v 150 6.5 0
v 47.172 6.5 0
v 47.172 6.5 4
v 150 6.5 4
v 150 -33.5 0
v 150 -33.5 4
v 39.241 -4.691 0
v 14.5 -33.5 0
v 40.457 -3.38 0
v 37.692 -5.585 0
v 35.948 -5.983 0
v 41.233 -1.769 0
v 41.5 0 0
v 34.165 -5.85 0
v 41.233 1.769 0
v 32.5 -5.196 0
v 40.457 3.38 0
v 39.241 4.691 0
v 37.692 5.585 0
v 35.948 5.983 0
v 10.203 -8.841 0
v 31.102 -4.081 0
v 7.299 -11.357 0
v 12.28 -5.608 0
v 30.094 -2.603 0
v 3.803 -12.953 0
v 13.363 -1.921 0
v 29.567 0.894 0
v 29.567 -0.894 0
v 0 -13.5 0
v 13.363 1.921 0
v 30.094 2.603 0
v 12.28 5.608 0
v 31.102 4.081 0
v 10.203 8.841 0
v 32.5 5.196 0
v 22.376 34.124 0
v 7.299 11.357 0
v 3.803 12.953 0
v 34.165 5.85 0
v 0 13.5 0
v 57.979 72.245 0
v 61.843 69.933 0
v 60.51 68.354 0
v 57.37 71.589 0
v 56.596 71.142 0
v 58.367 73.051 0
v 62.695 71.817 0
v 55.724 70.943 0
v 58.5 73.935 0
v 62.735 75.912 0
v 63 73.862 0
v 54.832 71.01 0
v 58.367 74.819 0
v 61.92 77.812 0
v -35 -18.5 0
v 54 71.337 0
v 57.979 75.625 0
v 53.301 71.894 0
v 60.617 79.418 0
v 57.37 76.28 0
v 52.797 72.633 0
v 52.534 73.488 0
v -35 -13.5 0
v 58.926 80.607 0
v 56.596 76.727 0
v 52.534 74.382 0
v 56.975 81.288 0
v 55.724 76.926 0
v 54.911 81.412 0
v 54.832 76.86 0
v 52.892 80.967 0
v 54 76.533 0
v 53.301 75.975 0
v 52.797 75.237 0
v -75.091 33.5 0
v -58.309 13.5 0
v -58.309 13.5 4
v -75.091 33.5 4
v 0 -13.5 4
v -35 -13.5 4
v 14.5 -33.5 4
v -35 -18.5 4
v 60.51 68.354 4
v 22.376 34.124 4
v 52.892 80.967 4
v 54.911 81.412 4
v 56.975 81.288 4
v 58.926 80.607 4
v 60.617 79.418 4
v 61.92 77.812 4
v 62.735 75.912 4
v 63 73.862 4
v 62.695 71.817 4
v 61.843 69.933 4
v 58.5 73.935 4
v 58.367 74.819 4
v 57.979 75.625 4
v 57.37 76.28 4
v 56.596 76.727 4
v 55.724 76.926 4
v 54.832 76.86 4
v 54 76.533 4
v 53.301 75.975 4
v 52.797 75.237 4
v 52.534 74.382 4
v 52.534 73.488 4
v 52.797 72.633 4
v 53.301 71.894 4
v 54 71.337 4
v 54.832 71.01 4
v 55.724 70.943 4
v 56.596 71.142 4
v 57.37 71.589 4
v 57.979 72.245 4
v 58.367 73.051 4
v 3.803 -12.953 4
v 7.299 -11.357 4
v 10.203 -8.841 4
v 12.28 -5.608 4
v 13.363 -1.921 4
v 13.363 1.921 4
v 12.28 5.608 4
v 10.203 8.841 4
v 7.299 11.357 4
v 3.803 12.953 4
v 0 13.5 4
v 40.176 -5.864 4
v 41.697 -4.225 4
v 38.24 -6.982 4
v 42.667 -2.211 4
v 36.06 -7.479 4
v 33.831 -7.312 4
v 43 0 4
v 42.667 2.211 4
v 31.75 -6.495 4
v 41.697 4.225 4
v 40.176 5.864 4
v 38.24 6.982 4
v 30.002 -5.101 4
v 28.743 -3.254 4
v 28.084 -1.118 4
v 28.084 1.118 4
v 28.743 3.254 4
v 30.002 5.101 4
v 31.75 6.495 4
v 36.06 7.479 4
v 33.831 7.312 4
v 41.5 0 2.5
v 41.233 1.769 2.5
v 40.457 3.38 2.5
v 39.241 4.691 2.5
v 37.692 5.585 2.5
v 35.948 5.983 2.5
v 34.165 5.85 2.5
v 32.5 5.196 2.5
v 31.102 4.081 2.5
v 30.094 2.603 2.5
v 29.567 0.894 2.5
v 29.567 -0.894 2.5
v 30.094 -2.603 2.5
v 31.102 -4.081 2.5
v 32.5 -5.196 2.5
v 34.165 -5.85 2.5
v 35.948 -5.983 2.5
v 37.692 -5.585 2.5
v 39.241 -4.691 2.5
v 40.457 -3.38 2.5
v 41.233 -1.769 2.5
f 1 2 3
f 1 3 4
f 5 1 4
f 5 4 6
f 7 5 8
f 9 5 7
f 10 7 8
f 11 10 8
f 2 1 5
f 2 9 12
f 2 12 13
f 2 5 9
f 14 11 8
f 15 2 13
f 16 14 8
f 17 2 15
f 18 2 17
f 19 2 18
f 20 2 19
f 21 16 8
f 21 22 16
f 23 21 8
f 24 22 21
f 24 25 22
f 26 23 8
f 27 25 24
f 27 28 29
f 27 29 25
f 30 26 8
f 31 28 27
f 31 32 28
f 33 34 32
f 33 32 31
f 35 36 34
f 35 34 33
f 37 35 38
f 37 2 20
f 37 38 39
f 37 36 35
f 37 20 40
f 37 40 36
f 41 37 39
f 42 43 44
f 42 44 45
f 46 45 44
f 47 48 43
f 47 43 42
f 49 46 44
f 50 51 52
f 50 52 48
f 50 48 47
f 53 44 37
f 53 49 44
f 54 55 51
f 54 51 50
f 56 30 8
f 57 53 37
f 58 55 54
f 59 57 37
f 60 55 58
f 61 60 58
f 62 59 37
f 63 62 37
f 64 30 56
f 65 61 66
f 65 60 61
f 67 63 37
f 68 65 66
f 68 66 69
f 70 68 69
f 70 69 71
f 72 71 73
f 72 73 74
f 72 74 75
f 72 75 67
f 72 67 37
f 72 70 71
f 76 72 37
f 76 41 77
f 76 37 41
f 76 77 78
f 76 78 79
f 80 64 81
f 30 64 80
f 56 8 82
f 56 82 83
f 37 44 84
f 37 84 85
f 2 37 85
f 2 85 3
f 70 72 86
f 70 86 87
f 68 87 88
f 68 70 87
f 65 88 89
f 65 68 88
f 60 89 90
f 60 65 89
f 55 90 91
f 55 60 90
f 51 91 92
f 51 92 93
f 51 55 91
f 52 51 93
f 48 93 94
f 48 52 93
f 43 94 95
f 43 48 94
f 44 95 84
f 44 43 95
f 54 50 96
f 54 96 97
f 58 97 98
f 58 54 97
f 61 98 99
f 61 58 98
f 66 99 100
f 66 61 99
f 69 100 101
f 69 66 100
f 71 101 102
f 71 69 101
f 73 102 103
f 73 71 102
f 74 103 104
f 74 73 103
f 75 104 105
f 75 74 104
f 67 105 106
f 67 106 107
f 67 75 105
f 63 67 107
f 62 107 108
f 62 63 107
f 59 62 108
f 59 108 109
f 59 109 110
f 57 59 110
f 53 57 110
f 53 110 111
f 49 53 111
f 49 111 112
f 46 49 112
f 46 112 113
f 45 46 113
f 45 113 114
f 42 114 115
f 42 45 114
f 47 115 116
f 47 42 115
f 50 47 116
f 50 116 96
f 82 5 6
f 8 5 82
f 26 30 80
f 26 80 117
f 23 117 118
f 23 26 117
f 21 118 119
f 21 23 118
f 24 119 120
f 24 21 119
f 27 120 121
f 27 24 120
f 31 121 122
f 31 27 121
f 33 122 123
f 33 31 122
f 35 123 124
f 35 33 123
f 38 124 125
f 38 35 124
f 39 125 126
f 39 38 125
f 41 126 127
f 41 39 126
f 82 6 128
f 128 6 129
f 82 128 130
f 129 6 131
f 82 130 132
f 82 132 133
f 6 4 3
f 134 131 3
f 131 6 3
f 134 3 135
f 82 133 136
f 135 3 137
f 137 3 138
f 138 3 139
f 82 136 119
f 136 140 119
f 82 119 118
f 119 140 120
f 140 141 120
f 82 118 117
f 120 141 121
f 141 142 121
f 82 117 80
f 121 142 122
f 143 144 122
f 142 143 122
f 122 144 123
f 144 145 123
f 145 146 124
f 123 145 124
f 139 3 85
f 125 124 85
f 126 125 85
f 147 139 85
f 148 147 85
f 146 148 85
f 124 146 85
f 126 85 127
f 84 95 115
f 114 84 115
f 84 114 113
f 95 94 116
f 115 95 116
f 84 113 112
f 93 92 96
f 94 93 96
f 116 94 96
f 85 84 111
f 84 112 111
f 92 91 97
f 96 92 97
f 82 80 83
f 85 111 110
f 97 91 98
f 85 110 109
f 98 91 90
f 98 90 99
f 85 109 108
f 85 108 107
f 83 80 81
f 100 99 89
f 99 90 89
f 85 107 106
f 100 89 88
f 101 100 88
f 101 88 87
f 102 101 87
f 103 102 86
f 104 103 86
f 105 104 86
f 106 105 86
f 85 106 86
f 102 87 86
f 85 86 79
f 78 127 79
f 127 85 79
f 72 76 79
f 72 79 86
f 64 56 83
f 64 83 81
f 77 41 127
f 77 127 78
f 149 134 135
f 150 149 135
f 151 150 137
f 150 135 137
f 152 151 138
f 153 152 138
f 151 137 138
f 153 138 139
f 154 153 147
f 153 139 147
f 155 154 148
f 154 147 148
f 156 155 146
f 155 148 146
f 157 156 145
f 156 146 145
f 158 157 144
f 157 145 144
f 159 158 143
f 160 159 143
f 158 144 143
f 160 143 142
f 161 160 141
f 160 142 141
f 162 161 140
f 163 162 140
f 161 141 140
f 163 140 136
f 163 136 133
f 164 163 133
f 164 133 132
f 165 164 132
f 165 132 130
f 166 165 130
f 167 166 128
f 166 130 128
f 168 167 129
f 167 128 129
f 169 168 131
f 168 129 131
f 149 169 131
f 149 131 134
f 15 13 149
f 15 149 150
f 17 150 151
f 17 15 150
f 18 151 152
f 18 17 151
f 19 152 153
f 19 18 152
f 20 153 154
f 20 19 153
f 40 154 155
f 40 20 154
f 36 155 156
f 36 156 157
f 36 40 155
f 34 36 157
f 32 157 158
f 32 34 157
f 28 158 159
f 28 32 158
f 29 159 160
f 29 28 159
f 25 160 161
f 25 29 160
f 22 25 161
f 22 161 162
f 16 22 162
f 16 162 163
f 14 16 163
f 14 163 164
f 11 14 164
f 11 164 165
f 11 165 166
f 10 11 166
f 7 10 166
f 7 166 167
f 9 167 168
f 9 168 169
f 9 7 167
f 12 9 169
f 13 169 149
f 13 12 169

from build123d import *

# Parameters (mm, degrees)
SKETCH_1_R             = 3
SKETCH_1_R_2           = 6
SM_BASE_FLANGE_1_DEPTH = 4
CHAMFER_2_SIZE         = 1.5


# Sheet-metal steps are written as plain solids
with BuildPart() as part:
    # Sketch 1 → Базовая кромка1 (new body)
    with BuildSketch(Plane.XY):
        with BuildLine():
            Line((60.509861789, 68.353533944), (22.375898858, 34.12410114))
            Line((22.375898858, 34.12410114), (47.171572875, 6.5))
            Line((47.171572875, 6.5), (150, 6.5))
            Line((150, 6.5), (150, -33.5))
            Line((150, -33.5), (14.5, -33.5))
            Line((14.5, -33.5), (-35, -18.5))
            Line((-35, -18.5), (-35, -13.5))
            Line((-35, -13.5), (0, -13.5))
            ThreePointArc((0, -13.5), (13.5, 0), (0, 13.5))
            Line((0, 13.5), (-58.308631084, 13.5))
            Line((-58.308631084, 13.5), (-75.090623708, 33.5))
            Line((-75.090623708, 33.5), (52.891961096, 80.966804205))
            ThreePointArc((52.891961096, 80.966804205), (61.919955994, 77.812259079), (60.509861789, 68.353533944))
        make_face()
        with Locations((55.5, 73.934867553)):
            Circle(SKETCH_1_R, mode=Mode.SUBTRACT)
        with Locations((35.5, 0)):
            Circle(SKETCH_1_R_2, mode=Mode.SUBTRACT)
    extrude(amount=SM_BASE_FLANGE_1_DEPTH)

    # Фаска2
    chamfer_2_edges = [part.edges().sort_by_distance(p)[0] for p in [
        (29.5, 0, 4),
    ]]
    chamfer(chamfer_2_edges, length=CHAMFER_2_SIZE)


solid = part.part
